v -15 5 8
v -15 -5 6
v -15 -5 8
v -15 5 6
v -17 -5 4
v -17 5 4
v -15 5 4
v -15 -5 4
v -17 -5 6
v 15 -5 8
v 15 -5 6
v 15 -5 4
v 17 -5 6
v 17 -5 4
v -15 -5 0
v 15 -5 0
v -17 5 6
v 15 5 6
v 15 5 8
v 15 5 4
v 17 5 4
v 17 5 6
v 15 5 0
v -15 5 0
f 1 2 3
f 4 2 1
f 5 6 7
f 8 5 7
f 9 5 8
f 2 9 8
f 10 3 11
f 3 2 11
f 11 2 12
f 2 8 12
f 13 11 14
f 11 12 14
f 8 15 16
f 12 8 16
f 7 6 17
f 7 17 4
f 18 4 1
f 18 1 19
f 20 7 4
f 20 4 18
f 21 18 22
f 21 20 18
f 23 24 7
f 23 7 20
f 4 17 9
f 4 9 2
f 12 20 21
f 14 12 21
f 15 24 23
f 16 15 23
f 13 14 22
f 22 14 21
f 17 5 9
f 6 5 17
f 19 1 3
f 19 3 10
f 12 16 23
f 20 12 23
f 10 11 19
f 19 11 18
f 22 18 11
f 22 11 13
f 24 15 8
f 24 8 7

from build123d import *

# Parameters (mm, degrees)
F0_W     = 30
F0_H     = 10
F1_DEPTH = 4
F2_W     = 34
F2_H     = 10
F3_DEPTH = 2
F4_W     = 30
F4_H     = 10
F5_DEPTH = 1.5
F6_W     = 30
F6_H     = 10
F7_DEPTH = 0.5


with BuildPart() as f1:
    # F0 (on Top) → F1 (new body)
    with BuildSketch(Plane.XY):
        Rectangle(F0_W, F0_H)
    extrude(amount=F1_DEPTH)

    # F2 (on face) → F3 (join)
    with BuildSketch(Plane.XY.offset(4)):
        Rectangle(F2_W, F2_H)
    extrude(amount=F3_DEPTH)

    # F4 (on face) → F5 (join)
    with BuildSketch(Plane.XY.offset(6)):
        Rectangle(F4_W, F4_H)
    extrude(amount=F5_DEPTH)

    # F6 (on face) → F7 (join)
    with BuildSketch(Plane.XY.offset(7.5)):
        Rectangle(F6_W, F6_H)
    extrude(amount=F7_DEPTH)


solid = f1.part
